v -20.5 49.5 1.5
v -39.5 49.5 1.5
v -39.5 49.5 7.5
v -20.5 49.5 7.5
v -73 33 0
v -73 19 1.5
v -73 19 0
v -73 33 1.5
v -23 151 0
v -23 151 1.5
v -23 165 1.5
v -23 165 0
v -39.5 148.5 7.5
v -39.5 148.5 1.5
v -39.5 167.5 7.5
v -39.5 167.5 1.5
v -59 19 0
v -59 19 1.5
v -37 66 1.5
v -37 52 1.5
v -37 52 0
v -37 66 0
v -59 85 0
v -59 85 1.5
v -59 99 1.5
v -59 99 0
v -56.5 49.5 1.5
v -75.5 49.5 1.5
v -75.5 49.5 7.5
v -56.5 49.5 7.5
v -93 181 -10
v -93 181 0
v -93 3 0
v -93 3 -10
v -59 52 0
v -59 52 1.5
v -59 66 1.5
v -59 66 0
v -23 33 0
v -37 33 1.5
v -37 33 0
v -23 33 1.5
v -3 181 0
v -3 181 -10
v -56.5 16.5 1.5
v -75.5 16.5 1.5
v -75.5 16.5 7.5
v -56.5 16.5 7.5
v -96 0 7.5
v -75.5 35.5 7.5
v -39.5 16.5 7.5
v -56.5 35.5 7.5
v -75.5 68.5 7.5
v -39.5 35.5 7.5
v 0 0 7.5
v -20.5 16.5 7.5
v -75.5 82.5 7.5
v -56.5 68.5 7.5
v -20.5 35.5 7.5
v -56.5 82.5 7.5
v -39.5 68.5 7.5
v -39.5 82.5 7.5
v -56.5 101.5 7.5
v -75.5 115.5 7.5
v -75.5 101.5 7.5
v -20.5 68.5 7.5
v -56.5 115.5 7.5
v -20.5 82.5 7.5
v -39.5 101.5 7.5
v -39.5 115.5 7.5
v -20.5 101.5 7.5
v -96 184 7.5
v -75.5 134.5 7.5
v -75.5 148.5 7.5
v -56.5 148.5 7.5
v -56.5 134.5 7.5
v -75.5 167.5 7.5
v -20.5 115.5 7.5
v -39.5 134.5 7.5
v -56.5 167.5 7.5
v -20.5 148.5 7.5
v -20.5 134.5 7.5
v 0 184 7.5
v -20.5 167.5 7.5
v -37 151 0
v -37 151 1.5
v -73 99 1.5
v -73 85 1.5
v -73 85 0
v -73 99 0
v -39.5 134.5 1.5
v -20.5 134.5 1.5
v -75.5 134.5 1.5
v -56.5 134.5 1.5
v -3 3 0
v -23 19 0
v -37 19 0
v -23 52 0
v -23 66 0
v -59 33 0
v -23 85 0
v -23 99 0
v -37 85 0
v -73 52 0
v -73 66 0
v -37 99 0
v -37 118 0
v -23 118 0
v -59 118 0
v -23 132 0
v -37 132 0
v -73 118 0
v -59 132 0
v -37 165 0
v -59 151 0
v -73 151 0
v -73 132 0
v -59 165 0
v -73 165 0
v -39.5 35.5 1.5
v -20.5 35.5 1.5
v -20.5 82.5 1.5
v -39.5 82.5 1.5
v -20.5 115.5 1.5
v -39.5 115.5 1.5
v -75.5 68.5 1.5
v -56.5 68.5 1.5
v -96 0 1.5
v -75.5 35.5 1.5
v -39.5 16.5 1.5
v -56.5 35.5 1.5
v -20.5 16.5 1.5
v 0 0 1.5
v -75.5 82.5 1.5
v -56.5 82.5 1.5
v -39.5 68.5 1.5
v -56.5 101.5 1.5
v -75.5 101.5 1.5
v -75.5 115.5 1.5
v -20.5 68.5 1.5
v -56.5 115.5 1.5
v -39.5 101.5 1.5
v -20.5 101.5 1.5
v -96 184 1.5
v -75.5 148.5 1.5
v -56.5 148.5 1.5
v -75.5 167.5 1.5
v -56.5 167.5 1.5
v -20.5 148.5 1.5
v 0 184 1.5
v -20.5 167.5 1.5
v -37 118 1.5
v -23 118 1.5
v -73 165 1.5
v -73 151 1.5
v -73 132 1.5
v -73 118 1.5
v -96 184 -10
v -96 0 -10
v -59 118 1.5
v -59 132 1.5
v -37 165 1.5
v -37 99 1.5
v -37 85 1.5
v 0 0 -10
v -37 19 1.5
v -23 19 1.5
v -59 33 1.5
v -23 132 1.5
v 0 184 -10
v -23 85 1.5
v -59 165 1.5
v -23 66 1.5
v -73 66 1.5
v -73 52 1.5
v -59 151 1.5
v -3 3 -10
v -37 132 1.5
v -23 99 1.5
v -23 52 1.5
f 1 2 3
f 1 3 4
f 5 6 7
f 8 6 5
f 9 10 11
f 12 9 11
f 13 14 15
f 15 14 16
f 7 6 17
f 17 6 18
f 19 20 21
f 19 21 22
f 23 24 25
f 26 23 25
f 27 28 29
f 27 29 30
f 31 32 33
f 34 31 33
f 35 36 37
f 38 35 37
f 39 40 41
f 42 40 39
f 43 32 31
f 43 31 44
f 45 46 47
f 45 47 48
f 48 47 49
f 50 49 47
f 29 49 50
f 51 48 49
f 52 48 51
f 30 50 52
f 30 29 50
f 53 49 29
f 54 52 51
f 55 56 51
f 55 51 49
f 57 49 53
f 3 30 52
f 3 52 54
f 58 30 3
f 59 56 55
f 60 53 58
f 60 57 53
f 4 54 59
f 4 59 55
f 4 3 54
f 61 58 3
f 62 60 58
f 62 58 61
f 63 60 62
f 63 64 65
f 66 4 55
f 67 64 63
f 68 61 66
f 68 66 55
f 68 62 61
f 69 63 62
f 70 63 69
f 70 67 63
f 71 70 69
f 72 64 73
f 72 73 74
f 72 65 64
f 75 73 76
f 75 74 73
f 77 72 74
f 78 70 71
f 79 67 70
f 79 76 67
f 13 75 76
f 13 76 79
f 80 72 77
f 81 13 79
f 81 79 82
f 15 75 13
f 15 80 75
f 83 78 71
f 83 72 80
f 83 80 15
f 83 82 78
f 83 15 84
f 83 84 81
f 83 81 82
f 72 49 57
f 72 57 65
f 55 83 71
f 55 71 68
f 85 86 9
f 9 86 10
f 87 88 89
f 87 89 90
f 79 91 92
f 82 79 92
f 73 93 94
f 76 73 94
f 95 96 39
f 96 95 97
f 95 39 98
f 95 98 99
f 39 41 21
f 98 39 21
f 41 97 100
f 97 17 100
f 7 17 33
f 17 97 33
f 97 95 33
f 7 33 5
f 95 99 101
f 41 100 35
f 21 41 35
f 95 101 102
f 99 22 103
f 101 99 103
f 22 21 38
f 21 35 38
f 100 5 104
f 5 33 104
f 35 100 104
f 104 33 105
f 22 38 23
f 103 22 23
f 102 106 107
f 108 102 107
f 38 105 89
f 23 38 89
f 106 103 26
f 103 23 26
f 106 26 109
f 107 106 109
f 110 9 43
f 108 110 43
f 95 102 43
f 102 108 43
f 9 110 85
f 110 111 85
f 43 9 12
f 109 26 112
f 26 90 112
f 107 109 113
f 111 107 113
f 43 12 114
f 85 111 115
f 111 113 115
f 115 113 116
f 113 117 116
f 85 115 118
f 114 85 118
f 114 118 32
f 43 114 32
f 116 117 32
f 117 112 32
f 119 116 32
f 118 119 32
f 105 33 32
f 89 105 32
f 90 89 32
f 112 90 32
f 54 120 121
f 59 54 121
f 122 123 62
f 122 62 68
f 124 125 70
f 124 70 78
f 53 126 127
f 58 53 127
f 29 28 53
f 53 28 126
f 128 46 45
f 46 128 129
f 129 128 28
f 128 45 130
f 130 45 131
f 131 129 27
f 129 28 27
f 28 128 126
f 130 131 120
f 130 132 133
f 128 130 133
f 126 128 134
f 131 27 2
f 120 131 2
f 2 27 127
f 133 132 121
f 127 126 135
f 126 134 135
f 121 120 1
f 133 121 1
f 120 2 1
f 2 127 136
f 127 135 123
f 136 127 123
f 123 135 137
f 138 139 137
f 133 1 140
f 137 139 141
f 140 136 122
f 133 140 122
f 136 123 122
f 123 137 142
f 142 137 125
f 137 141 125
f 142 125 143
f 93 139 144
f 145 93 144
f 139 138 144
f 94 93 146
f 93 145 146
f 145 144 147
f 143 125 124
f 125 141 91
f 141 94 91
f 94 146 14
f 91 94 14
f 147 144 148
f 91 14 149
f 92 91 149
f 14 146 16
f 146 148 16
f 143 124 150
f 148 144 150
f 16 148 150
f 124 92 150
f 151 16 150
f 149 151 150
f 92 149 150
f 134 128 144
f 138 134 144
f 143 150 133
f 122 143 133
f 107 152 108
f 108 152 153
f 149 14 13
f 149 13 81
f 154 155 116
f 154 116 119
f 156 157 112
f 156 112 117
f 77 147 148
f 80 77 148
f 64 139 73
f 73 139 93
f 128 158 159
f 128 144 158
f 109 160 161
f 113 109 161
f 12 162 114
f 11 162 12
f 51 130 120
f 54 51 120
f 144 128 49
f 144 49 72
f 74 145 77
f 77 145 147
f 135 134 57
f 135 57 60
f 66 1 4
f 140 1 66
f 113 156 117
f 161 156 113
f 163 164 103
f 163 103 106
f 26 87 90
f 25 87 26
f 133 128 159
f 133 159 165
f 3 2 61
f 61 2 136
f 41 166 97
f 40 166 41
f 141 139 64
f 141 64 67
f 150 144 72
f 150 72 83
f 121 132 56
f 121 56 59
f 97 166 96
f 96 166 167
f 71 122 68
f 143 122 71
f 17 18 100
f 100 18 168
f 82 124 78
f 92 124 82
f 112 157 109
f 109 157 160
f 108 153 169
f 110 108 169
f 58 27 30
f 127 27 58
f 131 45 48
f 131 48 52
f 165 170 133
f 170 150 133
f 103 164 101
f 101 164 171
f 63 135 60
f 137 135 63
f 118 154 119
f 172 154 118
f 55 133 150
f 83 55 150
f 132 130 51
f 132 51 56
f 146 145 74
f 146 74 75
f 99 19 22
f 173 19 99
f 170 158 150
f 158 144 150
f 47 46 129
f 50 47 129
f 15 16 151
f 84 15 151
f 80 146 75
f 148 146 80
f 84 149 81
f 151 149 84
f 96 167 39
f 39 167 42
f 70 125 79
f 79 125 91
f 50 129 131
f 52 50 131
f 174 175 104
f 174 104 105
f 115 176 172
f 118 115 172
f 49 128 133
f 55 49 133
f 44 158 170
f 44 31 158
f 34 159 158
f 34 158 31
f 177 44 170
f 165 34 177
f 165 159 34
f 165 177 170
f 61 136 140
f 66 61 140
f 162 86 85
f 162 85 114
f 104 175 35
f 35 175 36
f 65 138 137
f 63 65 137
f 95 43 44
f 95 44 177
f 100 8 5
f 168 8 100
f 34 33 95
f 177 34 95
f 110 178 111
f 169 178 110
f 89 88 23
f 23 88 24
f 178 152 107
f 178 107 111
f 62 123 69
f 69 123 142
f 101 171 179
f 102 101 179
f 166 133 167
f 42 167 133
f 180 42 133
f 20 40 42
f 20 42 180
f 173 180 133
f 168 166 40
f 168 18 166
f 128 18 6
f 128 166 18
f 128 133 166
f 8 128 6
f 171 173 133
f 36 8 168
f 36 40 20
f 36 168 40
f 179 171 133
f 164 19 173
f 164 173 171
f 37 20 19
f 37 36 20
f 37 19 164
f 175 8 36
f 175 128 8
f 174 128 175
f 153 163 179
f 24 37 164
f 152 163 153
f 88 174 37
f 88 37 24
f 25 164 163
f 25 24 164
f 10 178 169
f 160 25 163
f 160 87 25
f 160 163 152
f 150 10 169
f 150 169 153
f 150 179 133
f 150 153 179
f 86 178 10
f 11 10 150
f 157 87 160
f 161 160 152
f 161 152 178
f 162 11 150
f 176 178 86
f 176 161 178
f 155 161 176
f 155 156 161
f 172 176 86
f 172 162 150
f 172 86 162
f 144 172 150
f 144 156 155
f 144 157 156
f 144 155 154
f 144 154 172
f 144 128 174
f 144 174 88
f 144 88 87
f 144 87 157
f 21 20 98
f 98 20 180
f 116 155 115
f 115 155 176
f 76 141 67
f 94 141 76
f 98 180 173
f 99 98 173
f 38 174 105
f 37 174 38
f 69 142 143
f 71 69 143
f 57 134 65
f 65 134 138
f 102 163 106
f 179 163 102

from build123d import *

# Parameters (mm, degrees)
SKETCH1_W           = 184
SKETCH1_H           = 96
BOSS_EXTRUDE1_DEPTH = 1.5
SKETCH2_W           = 14
SKETCH2_H           = 14
CUT_EXTRUDE1_DEPTH  = 1.5
SKETCH3_W           = 96
SKETCH3_H           = 184
SKETCH3_W_2         = 19
SKETCH3_H_2         = 19
UP_COVER_DEPTH      = 6
SKETCH4_W           = 96
SKETCH4_H           = 184
SKETCH4_W_2         = 90
SKETCH4_H_2         = 178
BOSS_EXTRUDE3_DEPTH = 10


with BuildPart() as part:
    # Sketch1 → Boss-Extrude1 (new body)
    with BuildSketch(Plane(origin=(0, 0, 0), x_dir=(0, 1, 0), z_dir=(0, 0, 1))):
        with Locations((92, 48)):
            Rectangle(SKETCH1_W, SKETCH1_H)
    extrude(amount=BOSS_EXTRUDE1_DEPTH)

    # Sketch2 → Cut-Extrude1 (cut)
    with BuildSketch(Plane.XY.offset(1.5)):
        with Locations((-66, 59)):
            Rectangle(SKETCH2_W, SKETCH2_H)
        with Locations((-66, 92)):
            Rectangle(SKETCH2_W, SKETCH2_H)
        with Locations((-66, 26)):
            Rectangle(SKETCH2_W, SKETCH2_H)
        with Locations((-66, 125)):
            Rectangle(SKETCH2_W, SKETCH2_H)
        with Locations((-66, 158)):
            Rectangle(SKETCH2_W, SKETCH2_H)
        with Locations((-30, 92)):
            Rectangle(SKETCH2_W, SKETCH2_H)
        with Locations((-30, 59)):
            Rectangle(SKETCH2_W, SKETCH2_H)
        with Locations((-30, 26)):
            Rectangle(SKETCH2_W, SKETCH2_H)
        with Locations((-30, 158)):
            Rectangle(SKETCH2_W, SKETCH2_H)
        with Locations((-30, 125)):
            Rectangle(SKETCH2_W, SKETCH2_H)
    extrude(amount=-CUT_EXTRUDE1_DEPTH, mode=Mode.SUBTRACT)

    # Sketch4 → Boss-Extrude3 (add)
    with BuildSketch(Plane(origin=(0, 0, 0), x_dir=(1, 0, 0), z_dir=(0, 0, -1))):
        with Locations((-48, -92)):
            Rectangle(SKETCH4_W, SKETCH4_H)
        with Locations((-48, -92)):
            Rectangle(SKETCH4_W_2, SKETCH4_H_2, mode=Mode.SUBTRACT)
    extrude(amount=BOSS_EXTRUDE3_DEPTH)


with BuildPart() as body_2:
    # Sketch3 → up-cover (new body)
    with BuildSketch(Plane.XY.offset(1.5)):
        with Locations((-48, 92)):
            Rectangle(SKETCH3_W, SKETCH3_H)
        with Locations((-66, 158)):
            Rectangle(SKETCH3_W_2, SKETCH3_H_2, mode=Mode.SUBTRACT)
        with Locations((-30, 158)):
            Rectangle(SKETCH3_W_2, SKETCH3_H_2, mode=Mode.SUBTRACT)
        with Locations((-30, 125)):
            Rectangle(SKETCH3_W_2, SKETCH3_H_2, mode=Mode.SUBTRACT)
        with Locations((-30, 92)):
            Rectangle(SKETCH3_W_2, SKETCH3_H_2, mode=Mode.SUBTRACT)
        with Locations((-30, 59)):
            Rectangle(SKETCH3_W_2, SKETCH3_H_2, mode=Mode.SUBTRACT)
        with Locations((-30, 26)):
            Rectangle(SKETCH3_W_2, SKETCH3_H_2, mode=Mode.SUBTRACT)
        with Locations((-66, 125)):
            Rectangle(SKETCH3_W_2, SKETCH3_H_2, mode=Mode.SUBTRACT)
        with Locations((-66, 92)):
            Rectangle(SKETCH3_W_2, SKETCH3_H_2, mode=Mode.SUBTRACT)
        with Locations((-66, 59)):
            Rectangle(SKETCH3_W_2, SKETCH3_H_2, mode=Mode.SUBTRACT)
        with Locations((-66, 26)):
            Rectangle(SKETCH3_W_2, SKETCH3_H_2, mode=Mode.SUBTRACT)
    extrude(amount=UP_COVER_DEPTH)


solid = Compound([part.part, body_2.part])
